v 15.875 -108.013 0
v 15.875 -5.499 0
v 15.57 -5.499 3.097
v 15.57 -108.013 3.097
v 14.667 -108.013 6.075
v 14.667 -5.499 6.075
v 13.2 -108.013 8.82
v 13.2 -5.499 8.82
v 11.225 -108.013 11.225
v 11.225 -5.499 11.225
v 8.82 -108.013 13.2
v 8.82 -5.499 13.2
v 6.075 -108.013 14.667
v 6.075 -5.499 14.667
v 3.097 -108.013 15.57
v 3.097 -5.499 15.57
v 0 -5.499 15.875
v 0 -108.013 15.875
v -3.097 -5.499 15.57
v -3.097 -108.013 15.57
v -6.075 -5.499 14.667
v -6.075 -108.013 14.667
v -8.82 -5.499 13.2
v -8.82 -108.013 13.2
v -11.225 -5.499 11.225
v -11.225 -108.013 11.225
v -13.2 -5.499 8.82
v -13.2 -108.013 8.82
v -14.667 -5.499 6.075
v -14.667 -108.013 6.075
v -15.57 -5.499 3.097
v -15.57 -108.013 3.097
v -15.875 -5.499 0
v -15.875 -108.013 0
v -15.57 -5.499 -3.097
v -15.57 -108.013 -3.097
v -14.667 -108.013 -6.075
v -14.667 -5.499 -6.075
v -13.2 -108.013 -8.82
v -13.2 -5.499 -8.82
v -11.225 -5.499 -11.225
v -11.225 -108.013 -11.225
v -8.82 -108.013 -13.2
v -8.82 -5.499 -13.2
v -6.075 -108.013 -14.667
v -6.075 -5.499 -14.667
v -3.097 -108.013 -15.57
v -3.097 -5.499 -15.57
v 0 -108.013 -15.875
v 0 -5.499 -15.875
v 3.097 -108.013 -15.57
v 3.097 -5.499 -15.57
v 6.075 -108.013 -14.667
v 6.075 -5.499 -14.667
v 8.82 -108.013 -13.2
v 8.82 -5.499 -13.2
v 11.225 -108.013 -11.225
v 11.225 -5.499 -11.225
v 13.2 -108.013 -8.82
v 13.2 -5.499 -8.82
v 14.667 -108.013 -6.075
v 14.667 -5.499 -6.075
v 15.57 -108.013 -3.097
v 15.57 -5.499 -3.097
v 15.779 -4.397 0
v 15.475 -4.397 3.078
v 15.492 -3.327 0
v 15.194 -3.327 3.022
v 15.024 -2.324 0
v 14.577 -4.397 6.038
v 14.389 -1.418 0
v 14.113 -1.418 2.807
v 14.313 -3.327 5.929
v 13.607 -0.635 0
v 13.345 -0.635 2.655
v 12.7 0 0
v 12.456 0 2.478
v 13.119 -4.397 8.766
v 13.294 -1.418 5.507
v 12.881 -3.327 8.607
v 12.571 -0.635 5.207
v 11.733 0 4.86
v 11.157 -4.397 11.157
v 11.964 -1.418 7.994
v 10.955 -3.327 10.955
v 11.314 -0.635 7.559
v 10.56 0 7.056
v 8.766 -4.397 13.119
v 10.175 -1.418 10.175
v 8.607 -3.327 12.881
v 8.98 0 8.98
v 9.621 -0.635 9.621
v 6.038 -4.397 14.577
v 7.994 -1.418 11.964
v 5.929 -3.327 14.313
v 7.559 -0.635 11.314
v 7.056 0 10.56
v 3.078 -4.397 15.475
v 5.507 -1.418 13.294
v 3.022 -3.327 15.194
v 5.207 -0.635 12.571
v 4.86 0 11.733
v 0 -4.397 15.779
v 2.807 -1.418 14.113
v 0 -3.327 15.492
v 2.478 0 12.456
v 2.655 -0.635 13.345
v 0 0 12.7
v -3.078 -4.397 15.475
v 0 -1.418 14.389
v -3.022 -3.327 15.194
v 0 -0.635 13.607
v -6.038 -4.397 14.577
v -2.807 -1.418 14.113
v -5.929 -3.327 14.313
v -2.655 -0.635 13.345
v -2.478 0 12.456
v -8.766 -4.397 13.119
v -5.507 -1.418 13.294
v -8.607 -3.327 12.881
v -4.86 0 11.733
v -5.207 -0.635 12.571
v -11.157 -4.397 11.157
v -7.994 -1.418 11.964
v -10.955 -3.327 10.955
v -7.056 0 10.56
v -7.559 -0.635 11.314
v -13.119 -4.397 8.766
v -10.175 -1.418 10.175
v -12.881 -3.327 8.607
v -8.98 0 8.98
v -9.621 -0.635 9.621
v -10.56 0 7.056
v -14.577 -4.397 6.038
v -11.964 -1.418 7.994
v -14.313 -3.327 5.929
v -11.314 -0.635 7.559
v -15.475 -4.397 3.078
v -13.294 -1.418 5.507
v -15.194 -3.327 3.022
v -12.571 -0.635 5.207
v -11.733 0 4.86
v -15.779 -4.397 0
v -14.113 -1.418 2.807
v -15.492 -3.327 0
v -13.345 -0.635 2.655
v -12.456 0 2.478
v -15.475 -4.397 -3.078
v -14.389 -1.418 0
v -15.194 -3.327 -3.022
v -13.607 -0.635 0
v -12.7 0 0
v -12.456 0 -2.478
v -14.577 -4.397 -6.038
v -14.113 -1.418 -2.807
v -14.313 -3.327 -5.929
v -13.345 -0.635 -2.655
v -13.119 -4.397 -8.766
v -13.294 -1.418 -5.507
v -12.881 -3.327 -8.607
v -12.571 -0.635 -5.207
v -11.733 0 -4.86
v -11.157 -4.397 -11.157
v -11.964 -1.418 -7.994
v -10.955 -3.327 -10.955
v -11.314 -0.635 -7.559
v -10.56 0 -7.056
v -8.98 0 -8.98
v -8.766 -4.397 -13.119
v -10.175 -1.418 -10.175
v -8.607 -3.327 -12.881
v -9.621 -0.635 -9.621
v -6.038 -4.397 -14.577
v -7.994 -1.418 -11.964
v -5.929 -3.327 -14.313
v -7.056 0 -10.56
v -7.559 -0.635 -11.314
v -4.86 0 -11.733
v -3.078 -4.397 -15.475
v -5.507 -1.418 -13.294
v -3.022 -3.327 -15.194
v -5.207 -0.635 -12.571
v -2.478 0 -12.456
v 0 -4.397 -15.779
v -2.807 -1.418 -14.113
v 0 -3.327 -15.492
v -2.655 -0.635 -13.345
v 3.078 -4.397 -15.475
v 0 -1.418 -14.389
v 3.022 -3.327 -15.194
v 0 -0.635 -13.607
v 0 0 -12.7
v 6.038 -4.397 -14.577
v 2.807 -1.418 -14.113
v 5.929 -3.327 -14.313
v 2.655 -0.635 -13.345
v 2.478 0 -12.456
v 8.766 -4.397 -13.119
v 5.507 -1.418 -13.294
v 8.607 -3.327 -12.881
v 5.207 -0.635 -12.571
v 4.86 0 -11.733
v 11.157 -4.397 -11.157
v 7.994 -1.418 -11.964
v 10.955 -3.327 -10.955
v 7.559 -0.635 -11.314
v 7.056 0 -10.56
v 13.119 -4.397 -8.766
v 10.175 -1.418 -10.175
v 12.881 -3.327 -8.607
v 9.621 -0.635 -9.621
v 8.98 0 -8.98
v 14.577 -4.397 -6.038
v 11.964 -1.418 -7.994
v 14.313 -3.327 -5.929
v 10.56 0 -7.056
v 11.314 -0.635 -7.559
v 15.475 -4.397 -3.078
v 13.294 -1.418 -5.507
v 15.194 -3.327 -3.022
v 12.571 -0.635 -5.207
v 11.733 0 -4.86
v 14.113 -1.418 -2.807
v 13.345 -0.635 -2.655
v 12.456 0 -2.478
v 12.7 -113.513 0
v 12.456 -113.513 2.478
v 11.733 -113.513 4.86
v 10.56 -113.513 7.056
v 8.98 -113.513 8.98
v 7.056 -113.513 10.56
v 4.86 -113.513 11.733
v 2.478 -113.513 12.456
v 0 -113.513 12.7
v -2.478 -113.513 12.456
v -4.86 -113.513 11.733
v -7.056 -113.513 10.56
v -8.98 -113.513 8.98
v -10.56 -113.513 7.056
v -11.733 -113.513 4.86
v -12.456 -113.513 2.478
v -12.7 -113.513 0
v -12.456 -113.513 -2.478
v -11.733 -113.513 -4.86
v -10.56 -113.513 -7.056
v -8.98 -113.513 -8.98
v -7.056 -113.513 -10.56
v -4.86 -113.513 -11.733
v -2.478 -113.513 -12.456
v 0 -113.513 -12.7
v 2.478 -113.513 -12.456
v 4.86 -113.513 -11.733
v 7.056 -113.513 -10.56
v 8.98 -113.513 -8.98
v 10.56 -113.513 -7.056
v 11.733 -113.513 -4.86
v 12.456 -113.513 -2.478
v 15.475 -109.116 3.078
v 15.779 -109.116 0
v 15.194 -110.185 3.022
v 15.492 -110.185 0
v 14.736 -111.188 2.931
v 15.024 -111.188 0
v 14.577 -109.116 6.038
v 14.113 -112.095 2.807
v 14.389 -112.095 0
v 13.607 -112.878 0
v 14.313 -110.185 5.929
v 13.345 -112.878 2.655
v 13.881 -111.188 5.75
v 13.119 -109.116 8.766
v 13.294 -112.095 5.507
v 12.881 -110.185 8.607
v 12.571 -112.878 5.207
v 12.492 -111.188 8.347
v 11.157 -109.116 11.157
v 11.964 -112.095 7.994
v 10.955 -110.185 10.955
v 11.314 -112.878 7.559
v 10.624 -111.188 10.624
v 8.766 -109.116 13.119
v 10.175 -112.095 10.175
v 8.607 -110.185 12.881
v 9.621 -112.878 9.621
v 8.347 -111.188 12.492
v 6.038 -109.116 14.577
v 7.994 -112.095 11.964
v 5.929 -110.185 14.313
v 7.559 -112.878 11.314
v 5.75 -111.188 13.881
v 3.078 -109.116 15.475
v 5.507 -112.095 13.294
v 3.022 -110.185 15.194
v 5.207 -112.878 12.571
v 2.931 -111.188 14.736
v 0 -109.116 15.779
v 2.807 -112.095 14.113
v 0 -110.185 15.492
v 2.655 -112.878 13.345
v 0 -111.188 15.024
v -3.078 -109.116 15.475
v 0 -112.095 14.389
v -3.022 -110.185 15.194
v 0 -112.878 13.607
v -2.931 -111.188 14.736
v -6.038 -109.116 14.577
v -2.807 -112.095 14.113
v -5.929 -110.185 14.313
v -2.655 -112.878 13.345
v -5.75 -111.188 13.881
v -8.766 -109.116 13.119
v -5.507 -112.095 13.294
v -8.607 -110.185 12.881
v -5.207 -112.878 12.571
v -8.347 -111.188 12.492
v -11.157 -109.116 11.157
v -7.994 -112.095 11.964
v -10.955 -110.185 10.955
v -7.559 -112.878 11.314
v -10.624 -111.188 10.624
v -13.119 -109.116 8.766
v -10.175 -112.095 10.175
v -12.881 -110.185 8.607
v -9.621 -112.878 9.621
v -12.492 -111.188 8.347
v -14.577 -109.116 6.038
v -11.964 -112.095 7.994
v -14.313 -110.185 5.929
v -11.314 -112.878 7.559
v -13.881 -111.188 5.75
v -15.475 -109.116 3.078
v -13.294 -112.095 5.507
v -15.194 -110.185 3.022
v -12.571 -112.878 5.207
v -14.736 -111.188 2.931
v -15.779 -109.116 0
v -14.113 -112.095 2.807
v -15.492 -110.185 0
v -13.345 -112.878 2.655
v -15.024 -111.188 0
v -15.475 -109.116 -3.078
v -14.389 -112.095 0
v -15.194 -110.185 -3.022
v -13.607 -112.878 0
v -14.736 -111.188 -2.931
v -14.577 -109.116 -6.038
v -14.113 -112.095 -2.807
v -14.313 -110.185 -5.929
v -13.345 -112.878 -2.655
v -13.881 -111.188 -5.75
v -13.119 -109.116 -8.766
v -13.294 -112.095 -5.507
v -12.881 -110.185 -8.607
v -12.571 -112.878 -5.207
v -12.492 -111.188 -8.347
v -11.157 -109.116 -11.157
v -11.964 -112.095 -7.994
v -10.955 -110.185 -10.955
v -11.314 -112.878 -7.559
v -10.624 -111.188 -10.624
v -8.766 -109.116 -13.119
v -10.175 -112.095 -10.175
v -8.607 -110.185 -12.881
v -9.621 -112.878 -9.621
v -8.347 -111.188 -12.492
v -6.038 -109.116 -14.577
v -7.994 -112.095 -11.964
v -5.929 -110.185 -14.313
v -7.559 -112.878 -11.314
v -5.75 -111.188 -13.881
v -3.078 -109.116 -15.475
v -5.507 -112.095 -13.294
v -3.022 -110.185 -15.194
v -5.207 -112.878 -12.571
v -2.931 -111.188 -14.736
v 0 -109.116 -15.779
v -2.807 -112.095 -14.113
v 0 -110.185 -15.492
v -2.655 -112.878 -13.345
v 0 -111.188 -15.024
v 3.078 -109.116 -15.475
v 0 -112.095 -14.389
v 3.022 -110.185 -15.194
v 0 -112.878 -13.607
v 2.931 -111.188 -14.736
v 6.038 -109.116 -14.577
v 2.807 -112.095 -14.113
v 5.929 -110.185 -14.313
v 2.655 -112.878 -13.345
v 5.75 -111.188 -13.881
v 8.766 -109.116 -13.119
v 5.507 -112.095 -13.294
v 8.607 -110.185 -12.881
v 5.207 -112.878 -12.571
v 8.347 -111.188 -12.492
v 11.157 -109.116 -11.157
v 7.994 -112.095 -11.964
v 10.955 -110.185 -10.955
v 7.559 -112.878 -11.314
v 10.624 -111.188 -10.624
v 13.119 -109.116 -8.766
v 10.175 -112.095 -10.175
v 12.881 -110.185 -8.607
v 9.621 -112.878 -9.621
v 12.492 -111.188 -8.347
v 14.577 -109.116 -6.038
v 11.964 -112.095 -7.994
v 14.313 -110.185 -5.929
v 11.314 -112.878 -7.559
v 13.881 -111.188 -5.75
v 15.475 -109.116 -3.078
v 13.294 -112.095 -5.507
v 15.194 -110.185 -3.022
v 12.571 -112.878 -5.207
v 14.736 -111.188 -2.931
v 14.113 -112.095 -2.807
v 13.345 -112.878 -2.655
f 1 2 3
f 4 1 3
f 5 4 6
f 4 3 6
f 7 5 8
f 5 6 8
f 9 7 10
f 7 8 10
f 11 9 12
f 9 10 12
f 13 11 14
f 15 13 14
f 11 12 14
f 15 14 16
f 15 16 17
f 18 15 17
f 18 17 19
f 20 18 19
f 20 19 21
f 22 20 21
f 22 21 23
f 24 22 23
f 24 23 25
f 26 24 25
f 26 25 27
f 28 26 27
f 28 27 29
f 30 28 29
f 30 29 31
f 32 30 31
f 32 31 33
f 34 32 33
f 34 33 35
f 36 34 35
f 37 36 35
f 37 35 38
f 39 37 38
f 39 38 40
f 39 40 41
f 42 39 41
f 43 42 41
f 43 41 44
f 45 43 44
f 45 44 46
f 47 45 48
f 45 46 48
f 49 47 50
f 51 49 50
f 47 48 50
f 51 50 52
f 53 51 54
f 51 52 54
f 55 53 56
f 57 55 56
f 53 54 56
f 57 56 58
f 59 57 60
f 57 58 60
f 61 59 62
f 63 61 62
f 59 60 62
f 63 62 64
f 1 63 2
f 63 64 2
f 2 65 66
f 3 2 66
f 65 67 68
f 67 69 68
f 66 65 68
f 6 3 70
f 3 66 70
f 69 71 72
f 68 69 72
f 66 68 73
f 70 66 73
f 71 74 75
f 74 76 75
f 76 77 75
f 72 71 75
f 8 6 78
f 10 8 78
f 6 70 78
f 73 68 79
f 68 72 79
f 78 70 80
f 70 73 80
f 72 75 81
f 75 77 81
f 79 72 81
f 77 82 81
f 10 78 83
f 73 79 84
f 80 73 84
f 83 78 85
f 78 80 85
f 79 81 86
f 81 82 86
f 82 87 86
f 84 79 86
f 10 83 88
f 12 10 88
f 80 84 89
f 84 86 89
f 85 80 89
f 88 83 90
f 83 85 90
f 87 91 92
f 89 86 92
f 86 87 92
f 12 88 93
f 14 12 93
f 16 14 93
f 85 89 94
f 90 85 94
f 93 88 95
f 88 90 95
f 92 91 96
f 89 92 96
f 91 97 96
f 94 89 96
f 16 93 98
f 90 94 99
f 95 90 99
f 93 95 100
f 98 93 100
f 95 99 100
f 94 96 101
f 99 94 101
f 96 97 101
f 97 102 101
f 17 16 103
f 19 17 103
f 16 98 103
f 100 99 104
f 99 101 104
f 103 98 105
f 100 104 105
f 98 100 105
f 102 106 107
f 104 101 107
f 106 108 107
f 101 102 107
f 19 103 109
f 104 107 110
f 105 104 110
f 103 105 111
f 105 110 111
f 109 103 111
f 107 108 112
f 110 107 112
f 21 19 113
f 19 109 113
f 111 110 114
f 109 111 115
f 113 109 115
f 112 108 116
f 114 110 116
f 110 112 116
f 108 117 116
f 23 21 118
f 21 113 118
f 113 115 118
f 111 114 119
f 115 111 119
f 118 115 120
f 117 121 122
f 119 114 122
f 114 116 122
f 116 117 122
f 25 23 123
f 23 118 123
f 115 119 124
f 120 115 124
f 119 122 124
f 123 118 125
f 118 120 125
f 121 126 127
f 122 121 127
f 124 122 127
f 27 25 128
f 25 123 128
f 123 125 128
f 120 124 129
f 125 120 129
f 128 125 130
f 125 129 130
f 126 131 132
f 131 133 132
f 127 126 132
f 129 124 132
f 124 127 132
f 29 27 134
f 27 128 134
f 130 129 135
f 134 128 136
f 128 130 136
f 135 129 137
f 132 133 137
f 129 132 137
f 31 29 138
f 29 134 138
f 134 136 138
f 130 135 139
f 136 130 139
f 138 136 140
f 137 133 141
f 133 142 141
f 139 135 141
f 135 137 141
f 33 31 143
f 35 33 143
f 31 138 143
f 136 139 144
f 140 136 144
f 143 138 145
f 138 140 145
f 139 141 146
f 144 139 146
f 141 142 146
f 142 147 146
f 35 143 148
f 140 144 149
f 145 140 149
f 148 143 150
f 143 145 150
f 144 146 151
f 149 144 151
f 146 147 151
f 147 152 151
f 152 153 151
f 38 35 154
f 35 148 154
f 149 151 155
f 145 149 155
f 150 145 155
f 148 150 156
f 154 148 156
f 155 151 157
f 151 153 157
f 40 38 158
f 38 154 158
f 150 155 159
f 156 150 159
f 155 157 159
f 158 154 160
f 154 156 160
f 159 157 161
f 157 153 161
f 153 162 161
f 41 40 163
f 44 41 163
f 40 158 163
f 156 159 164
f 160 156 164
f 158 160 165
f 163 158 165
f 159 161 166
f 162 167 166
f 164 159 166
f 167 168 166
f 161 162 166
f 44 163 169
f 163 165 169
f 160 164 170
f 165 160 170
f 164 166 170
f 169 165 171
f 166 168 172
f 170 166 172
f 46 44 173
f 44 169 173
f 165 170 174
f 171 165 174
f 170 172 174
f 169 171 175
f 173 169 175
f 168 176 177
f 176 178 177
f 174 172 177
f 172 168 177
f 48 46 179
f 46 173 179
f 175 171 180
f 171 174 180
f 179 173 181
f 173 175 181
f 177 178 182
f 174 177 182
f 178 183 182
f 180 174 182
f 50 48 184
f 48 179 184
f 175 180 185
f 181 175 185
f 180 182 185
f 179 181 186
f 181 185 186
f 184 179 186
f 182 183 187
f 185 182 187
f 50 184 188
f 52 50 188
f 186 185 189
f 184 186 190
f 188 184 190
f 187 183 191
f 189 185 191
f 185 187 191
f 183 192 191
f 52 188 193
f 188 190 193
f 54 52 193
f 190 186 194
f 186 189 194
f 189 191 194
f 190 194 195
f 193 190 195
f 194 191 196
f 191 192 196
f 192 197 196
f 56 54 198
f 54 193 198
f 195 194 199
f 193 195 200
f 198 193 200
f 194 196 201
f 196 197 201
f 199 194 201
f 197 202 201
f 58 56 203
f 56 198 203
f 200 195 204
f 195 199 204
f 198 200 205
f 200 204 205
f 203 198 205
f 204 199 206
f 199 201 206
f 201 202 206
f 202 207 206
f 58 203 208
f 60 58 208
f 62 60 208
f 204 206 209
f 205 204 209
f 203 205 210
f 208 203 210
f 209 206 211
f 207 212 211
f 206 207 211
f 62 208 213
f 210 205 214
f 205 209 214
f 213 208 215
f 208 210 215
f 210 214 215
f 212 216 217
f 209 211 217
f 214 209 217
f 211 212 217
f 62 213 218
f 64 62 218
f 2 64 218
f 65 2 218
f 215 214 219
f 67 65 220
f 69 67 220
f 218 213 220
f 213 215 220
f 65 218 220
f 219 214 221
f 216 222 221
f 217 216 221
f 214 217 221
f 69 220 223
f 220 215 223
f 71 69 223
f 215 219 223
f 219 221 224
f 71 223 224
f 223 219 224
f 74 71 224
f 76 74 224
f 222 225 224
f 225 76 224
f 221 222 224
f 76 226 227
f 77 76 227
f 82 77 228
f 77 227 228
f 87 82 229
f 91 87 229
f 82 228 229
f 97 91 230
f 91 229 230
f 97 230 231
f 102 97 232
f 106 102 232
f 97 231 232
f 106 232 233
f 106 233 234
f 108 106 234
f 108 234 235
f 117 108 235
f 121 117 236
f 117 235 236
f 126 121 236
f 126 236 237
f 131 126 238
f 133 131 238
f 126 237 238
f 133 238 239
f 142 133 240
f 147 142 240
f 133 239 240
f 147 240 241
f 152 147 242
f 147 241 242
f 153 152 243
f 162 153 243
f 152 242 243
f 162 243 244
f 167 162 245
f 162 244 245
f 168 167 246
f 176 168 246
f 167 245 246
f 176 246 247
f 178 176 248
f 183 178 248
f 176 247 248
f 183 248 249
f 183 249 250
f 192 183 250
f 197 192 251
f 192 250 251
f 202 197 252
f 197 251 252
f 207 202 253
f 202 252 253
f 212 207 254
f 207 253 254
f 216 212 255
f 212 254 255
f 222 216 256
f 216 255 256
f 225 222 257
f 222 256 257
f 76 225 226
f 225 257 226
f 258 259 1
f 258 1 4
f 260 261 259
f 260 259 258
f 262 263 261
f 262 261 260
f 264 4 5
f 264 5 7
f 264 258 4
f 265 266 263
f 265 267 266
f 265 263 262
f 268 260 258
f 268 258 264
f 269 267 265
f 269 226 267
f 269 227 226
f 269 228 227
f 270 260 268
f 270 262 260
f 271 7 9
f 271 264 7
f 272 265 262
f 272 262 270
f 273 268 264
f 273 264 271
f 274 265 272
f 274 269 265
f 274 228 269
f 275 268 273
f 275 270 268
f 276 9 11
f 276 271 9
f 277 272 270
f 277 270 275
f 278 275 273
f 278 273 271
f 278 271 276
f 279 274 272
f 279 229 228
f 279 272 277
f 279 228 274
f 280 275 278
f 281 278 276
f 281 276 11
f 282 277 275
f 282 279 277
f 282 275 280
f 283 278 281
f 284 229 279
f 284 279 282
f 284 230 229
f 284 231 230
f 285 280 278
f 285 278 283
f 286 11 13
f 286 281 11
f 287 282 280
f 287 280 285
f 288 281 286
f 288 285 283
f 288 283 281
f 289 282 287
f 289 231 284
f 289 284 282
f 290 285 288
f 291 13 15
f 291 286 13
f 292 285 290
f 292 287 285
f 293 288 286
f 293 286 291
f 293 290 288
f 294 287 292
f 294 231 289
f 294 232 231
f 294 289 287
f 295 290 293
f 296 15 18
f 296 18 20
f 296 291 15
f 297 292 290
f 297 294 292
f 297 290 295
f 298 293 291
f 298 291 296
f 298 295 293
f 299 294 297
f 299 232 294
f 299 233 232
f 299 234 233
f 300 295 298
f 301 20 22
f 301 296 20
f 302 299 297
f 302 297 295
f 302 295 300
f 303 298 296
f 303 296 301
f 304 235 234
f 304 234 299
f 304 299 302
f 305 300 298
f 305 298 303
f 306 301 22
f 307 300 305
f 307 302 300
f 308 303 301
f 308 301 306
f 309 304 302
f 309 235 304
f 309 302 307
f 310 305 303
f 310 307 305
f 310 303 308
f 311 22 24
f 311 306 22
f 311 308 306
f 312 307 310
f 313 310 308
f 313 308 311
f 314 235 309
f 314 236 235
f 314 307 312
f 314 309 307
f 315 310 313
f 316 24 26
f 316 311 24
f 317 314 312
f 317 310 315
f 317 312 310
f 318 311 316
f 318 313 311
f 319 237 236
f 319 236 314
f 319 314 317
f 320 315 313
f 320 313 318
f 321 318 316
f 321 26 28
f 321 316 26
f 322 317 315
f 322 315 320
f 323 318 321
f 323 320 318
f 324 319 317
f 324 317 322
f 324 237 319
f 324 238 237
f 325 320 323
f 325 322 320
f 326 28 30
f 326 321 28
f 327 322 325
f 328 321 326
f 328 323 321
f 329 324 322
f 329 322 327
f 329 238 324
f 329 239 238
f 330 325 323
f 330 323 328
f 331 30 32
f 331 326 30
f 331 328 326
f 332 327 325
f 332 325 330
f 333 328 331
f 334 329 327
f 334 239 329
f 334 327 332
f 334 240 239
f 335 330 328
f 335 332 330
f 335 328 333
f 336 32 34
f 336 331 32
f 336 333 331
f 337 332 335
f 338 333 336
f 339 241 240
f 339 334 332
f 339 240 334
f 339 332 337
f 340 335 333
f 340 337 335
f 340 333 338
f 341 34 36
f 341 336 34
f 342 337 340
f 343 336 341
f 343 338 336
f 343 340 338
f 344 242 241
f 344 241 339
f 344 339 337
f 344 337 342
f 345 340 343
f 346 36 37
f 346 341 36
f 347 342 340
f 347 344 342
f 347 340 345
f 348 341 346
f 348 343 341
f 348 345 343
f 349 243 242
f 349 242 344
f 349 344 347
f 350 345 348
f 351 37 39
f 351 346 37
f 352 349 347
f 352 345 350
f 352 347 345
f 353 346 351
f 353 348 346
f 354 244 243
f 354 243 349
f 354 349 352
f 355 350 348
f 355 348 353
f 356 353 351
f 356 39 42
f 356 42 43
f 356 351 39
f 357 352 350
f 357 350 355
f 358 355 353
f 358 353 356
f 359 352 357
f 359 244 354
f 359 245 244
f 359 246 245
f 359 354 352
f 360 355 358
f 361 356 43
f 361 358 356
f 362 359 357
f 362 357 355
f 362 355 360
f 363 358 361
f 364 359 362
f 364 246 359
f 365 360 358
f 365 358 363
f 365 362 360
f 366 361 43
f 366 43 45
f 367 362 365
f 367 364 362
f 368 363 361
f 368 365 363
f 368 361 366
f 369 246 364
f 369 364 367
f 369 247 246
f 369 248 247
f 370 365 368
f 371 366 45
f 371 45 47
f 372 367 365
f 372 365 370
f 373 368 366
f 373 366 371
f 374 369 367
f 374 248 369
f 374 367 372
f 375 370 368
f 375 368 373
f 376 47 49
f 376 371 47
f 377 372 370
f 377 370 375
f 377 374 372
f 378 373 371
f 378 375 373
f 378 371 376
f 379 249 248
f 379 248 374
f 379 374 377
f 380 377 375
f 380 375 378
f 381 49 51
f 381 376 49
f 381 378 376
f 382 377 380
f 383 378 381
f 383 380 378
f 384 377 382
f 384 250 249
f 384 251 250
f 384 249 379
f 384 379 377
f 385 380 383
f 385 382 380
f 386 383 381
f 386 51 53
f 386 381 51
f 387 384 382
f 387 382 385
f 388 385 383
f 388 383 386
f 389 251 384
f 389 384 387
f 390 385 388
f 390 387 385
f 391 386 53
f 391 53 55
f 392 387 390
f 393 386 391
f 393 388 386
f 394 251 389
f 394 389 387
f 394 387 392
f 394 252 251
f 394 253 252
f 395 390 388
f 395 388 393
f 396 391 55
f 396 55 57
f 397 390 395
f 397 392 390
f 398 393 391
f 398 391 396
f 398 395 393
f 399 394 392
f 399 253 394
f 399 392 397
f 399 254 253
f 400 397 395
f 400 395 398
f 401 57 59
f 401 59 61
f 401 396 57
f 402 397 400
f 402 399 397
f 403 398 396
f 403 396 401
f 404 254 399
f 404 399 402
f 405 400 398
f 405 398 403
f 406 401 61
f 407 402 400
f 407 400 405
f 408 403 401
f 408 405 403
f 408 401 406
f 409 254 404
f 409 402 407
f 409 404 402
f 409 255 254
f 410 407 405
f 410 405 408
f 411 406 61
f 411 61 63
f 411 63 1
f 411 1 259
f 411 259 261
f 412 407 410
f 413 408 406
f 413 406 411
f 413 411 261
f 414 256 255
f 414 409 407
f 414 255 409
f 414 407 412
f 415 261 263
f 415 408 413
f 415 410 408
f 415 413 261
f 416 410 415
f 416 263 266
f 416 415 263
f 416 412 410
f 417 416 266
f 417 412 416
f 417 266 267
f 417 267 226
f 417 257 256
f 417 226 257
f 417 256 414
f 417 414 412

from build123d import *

# Parameters (mm, degrees)
F0_R     = 15.875
F1_DEPTH = 113.5126
F2_R     = 12.7
F3_DEPTH = 113.5126


# Not quite as in the source:
# - a fillet or chamfer that OpenCascade refuses, or shapes differently, is made with other operations: its cross-section is extruded or revolved along the edge and cut away or added


with BuildPart() as f1:
    # F0 (on Front) → F1 (new body)
    with BuildSketch(Plane.XZ):
        Circle(F0_R)
    extrude(amount=F1_DEPTH)

    # F2 (on face) → F3 (cut)
    with BuildSketch(Plane.XZ.offset(113.5126)):
        Circle(F2_R)
    extrude(amount=-F3_DEPTH, mode=Mode.SUBTRACT)

    # F4: fillet of radius 6.35 on 1 edges, made by hand

    # F4_s1 → F4_t2 (revolve, cut)
    with BuildSketch(Plane.XY):
        with BuildLine():
            ThreePointArc((15.875, -108.013338686), (15.024261314, -111.188338686), (12.7, -113.5126))
            Line((12.7, -113.5126), (15.875, -113.5126))
            Line((15.875, -113.5126), (15.875, -108.013338686))
        make_face()
    revolve(axis=Axis((0, -113.5126, 0), (0, -1, 0)), mode=Mode.SUBTRACT)

    # F5: fillet of radius 6.35 on 1 edges, made by hand

    # F5_s1 → F5_t2 (revolve, cut)
    with BuildSketch(Plane.XY):
        with BuildLine():
            ThreePointArc((15.875, -5.499261314), (15.024261314, -2.324261314), (12.7, 0))
            Line((12.7, 0), (15.875, 0))
            Line((15.875, 0), (15.875, -5.499261314))
        make_face()
    revolve(axis=Axis((0, 0, 0), (0, -1, 0)), mode=Mode.SUBTRACT)


solid = f1.part
